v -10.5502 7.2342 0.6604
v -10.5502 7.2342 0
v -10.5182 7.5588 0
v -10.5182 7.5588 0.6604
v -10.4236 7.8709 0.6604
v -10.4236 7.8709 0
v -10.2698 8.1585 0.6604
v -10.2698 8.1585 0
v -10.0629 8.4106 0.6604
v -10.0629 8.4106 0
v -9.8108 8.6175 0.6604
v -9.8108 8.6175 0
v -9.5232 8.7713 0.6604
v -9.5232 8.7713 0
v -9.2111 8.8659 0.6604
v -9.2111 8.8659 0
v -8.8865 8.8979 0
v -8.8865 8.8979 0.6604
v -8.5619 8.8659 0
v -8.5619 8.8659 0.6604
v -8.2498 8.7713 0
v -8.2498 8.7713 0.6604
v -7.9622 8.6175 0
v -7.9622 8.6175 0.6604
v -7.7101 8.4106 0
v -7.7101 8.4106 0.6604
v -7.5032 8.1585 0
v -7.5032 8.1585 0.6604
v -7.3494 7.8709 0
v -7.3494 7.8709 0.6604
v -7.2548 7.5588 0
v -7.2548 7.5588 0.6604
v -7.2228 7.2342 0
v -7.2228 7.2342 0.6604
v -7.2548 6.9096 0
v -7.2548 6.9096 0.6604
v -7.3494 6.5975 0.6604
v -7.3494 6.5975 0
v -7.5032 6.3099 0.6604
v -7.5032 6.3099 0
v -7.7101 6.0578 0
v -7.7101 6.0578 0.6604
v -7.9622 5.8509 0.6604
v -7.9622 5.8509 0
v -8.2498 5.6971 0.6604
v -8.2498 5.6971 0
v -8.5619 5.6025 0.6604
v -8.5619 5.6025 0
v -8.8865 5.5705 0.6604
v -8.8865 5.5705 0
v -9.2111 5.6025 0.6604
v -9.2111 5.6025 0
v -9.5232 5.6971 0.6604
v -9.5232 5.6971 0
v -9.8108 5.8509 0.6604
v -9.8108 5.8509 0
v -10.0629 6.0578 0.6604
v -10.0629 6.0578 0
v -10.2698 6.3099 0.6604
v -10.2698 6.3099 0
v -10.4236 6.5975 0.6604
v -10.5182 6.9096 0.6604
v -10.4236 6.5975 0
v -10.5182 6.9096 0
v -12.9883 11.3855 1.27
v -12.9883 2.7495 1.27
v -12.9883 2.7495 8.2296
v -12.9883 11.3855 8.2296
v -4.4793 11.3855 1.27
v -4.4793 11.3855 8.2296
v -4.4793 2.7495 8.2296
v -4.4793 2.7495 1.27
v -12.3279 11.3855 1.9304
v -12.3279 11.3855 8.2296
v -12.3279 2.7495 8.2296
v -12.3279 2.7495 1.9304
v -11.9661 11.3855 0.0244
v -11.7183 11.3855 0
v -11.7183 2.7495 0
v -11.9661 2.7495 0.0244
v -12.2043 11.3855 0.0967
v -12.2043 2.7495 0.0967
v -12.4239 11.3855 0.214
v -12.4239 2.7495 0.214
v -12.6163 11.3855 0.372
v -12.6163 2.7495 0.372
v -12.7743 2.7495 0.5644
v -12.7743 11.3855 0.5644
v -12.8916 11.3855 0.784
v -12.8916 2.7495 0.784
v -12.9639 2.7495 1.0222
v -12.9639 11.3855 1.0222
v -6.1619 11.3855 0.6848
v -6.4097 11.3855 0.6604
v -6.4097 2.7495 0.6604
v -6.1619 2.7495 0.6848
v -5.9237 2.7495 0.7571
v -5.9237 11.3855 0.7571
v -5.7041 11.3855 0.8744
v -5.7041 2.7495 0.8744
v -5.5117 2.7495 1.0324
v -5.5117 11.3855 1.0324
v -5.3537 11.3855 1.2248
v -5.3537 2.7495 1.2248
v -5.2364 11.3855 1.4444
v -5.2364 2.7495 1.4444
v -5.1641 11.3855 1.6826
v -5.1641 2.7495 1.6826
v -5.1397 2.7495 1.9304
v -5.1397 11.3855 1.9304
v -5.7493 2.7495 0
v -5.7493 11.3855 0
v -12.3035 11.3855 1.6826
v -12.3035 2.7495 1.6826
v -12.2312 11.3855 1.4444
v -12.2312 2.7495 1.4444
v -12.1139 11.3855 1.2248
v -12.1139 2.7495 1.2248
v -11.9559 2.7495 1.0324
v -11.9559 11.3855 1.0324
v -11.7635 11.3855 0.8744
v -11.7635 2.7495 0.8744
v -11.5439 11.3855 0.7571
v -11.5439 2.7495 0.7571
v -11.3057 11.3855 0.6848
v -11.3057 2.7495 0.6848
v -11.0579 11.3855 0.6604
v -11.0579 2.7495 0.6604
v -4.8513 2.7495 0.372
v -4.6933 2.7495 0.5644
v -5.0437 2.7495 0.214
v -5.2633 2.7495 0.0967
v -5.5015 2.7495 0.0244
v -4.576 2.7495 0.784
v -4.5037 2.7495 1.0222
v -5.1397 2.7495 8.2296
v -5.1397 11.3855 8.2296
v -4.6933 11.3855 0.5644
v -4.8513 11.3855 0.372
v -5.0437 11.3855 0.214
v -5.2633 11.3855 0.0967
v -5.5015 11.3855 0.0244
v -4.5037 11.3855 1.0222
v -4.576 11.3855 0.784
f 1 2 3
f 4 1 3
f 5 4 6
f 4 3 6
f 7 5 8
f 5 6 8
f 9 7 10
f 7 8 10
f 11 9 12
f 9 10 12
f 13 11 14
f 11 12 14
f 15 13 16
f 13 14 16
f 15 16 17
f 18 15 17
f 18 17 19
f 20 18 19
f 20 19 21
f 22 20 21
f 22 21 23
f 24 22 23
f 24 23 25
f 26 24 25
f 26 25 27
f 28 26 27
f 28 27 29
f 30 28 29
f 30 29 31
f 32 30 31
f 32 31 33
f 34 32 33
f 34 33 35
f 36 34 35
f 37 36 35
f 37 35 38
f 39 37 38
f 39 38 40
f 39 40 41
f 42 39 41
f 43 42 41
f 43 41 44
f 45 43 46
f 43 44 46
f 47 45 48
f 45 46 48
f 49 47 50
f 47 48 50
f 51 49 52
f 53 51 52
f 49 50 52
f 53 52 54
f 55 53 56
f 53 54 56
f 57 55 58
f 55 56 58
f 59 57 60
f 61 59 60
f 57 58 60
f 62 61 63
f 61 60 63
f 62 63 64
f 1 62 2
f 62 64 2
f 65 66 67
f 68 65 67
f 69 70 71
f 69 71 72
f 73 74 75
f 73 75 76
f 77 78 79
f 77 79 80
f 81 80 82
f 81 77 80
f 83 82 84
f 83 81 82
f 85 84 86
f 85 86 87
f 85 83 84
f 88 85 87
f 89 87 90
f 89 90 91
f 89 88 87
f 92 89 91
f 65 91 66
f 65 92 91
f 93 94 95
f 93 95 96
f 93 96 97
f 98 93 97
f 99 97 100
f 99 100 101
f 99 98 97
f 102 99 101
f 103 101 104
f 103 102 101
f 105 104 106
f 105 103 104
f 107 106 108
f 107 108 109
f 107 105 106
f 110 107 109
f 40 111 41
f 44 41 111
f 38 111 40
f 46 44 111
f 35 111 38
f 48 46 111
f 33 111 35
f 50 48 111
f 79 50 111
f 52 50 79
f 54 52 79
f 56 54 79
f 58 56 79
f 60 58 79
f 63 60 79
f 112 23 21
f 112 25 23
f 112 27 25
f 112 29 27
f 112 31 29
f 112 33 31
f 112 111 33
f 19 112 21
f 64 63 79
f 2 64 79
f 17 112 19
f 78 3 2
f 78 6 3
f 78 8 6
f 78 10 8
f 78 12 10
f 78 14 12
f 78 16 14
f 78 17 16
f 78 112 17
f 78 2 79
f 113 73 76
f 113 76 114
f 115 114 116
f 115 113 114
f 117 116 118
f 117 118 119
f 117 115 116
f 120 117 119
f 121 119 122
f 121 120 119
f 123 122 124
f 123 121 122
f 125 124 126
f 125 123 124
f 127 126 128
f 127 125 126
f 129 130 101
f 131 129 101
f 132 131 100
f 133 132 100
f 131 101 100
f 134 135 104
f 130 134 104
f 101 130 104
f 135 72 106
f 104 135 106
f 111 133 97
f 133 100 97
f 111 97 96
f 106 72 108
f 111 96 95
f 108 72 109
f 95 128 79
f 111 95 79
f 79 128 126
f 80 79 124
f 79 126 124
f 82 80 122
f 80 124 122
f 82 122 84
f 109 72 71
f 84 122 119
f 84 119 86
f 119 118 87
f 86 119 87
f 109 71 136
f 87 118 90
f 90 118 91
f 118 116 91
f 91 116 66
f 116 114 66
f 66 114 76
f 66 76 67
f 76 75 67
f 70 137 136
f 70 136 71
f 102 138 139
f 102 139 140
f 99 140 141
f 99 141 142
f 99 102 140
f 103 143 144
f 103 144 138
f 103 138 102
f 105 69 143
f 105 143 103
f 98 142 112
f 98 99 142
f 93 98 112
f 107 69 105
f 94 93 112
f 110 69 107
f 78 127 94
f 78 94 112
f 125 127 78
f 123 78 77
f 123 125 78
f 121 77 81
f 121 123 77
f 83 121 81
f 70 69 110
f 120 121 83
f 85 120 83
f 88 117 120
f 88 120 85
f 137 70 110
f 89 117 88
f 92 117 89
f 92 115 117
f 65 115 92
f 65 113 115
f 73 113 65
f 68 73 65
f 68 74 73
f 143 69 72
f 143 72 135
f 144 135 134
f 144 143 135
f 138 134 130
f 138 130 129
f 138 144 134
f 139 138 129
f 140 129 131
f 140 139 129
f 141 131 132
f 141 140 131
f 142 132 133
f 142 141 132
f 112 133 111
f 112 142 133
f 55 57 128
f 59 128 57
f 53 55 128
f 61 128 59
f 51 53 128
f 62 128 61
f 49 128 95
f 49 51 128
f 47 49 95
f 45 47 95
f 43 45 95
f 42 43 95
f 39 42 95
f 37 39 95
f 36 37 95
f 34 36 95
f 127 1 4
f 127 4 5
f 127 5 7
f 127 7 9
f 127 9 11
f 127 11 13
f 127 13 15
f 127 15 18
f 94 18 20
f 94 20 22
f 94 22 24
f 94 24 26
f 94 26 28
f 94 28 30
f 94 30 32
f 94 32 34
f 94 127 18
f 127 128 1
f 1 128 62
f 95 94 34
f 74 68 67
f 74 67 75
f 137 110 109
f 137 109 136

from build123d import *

# Parameters (mm, degrees)
BOSS_EXTRUDE1_DEPTH = 8.636
HOLE1_D             = 3.3274


with BuildPart() as part:
    # Sketch1 → Boss-Extrude1 (new body)
    with BuildSketch(Plane(origin=(0, 11.385459202, 0), x_dir=(-1, 0, 0), z_dir=(0, 1, 0))):
        with BuildLine():
            Line((5.749291724, 0), (11.718291724, 0))
            ThreePointArc((11.718291724, 0), (12.616317336, 0.371974388), (12.988291724, 1.27))
            Line((12.988291724, 1.27), (12.988291724, 8.2296))
            Line((12.988291724, 8.2296), (12.327891724, 8.2296))
            Line((12.327891724, 8.2296), (12.327891724, 1.9304))
            ThreePointArc((12.327891724, 1.9304), (11.955917336, 1.032374388), (11.057891724, 0.6604))
            Line((11.057891724, 0.6604), (6.409691724, 0.6604))
            ThreePointArc((6.409691724, 0.6604), (5.511666112, 1.032374388), (5.139691724, 1.9304))
            Line((5.139691724, 1.9304), (5.139691724, 8.2296))
            Line((5.139691724, 8.2296), (4.479291724, 8.2296))
            Line((4.479291724, 8.2296), (4.479291724, 1.27))
            ThreePointArc((4.479291724, 1.27), (4.851266112, 0.371974388), (5.749291724, 0))
        make_face()
    extrude(amount=-BOSS_EXTRUDE1_DEPTH)

    # Hole1 (through all)
    with Locations(Plane.XY.offset(0.6604)):
        with Locations((-8.886505488, 7.234194178)):
            Hole(HOLE1_D / 2)


solid = part.part
